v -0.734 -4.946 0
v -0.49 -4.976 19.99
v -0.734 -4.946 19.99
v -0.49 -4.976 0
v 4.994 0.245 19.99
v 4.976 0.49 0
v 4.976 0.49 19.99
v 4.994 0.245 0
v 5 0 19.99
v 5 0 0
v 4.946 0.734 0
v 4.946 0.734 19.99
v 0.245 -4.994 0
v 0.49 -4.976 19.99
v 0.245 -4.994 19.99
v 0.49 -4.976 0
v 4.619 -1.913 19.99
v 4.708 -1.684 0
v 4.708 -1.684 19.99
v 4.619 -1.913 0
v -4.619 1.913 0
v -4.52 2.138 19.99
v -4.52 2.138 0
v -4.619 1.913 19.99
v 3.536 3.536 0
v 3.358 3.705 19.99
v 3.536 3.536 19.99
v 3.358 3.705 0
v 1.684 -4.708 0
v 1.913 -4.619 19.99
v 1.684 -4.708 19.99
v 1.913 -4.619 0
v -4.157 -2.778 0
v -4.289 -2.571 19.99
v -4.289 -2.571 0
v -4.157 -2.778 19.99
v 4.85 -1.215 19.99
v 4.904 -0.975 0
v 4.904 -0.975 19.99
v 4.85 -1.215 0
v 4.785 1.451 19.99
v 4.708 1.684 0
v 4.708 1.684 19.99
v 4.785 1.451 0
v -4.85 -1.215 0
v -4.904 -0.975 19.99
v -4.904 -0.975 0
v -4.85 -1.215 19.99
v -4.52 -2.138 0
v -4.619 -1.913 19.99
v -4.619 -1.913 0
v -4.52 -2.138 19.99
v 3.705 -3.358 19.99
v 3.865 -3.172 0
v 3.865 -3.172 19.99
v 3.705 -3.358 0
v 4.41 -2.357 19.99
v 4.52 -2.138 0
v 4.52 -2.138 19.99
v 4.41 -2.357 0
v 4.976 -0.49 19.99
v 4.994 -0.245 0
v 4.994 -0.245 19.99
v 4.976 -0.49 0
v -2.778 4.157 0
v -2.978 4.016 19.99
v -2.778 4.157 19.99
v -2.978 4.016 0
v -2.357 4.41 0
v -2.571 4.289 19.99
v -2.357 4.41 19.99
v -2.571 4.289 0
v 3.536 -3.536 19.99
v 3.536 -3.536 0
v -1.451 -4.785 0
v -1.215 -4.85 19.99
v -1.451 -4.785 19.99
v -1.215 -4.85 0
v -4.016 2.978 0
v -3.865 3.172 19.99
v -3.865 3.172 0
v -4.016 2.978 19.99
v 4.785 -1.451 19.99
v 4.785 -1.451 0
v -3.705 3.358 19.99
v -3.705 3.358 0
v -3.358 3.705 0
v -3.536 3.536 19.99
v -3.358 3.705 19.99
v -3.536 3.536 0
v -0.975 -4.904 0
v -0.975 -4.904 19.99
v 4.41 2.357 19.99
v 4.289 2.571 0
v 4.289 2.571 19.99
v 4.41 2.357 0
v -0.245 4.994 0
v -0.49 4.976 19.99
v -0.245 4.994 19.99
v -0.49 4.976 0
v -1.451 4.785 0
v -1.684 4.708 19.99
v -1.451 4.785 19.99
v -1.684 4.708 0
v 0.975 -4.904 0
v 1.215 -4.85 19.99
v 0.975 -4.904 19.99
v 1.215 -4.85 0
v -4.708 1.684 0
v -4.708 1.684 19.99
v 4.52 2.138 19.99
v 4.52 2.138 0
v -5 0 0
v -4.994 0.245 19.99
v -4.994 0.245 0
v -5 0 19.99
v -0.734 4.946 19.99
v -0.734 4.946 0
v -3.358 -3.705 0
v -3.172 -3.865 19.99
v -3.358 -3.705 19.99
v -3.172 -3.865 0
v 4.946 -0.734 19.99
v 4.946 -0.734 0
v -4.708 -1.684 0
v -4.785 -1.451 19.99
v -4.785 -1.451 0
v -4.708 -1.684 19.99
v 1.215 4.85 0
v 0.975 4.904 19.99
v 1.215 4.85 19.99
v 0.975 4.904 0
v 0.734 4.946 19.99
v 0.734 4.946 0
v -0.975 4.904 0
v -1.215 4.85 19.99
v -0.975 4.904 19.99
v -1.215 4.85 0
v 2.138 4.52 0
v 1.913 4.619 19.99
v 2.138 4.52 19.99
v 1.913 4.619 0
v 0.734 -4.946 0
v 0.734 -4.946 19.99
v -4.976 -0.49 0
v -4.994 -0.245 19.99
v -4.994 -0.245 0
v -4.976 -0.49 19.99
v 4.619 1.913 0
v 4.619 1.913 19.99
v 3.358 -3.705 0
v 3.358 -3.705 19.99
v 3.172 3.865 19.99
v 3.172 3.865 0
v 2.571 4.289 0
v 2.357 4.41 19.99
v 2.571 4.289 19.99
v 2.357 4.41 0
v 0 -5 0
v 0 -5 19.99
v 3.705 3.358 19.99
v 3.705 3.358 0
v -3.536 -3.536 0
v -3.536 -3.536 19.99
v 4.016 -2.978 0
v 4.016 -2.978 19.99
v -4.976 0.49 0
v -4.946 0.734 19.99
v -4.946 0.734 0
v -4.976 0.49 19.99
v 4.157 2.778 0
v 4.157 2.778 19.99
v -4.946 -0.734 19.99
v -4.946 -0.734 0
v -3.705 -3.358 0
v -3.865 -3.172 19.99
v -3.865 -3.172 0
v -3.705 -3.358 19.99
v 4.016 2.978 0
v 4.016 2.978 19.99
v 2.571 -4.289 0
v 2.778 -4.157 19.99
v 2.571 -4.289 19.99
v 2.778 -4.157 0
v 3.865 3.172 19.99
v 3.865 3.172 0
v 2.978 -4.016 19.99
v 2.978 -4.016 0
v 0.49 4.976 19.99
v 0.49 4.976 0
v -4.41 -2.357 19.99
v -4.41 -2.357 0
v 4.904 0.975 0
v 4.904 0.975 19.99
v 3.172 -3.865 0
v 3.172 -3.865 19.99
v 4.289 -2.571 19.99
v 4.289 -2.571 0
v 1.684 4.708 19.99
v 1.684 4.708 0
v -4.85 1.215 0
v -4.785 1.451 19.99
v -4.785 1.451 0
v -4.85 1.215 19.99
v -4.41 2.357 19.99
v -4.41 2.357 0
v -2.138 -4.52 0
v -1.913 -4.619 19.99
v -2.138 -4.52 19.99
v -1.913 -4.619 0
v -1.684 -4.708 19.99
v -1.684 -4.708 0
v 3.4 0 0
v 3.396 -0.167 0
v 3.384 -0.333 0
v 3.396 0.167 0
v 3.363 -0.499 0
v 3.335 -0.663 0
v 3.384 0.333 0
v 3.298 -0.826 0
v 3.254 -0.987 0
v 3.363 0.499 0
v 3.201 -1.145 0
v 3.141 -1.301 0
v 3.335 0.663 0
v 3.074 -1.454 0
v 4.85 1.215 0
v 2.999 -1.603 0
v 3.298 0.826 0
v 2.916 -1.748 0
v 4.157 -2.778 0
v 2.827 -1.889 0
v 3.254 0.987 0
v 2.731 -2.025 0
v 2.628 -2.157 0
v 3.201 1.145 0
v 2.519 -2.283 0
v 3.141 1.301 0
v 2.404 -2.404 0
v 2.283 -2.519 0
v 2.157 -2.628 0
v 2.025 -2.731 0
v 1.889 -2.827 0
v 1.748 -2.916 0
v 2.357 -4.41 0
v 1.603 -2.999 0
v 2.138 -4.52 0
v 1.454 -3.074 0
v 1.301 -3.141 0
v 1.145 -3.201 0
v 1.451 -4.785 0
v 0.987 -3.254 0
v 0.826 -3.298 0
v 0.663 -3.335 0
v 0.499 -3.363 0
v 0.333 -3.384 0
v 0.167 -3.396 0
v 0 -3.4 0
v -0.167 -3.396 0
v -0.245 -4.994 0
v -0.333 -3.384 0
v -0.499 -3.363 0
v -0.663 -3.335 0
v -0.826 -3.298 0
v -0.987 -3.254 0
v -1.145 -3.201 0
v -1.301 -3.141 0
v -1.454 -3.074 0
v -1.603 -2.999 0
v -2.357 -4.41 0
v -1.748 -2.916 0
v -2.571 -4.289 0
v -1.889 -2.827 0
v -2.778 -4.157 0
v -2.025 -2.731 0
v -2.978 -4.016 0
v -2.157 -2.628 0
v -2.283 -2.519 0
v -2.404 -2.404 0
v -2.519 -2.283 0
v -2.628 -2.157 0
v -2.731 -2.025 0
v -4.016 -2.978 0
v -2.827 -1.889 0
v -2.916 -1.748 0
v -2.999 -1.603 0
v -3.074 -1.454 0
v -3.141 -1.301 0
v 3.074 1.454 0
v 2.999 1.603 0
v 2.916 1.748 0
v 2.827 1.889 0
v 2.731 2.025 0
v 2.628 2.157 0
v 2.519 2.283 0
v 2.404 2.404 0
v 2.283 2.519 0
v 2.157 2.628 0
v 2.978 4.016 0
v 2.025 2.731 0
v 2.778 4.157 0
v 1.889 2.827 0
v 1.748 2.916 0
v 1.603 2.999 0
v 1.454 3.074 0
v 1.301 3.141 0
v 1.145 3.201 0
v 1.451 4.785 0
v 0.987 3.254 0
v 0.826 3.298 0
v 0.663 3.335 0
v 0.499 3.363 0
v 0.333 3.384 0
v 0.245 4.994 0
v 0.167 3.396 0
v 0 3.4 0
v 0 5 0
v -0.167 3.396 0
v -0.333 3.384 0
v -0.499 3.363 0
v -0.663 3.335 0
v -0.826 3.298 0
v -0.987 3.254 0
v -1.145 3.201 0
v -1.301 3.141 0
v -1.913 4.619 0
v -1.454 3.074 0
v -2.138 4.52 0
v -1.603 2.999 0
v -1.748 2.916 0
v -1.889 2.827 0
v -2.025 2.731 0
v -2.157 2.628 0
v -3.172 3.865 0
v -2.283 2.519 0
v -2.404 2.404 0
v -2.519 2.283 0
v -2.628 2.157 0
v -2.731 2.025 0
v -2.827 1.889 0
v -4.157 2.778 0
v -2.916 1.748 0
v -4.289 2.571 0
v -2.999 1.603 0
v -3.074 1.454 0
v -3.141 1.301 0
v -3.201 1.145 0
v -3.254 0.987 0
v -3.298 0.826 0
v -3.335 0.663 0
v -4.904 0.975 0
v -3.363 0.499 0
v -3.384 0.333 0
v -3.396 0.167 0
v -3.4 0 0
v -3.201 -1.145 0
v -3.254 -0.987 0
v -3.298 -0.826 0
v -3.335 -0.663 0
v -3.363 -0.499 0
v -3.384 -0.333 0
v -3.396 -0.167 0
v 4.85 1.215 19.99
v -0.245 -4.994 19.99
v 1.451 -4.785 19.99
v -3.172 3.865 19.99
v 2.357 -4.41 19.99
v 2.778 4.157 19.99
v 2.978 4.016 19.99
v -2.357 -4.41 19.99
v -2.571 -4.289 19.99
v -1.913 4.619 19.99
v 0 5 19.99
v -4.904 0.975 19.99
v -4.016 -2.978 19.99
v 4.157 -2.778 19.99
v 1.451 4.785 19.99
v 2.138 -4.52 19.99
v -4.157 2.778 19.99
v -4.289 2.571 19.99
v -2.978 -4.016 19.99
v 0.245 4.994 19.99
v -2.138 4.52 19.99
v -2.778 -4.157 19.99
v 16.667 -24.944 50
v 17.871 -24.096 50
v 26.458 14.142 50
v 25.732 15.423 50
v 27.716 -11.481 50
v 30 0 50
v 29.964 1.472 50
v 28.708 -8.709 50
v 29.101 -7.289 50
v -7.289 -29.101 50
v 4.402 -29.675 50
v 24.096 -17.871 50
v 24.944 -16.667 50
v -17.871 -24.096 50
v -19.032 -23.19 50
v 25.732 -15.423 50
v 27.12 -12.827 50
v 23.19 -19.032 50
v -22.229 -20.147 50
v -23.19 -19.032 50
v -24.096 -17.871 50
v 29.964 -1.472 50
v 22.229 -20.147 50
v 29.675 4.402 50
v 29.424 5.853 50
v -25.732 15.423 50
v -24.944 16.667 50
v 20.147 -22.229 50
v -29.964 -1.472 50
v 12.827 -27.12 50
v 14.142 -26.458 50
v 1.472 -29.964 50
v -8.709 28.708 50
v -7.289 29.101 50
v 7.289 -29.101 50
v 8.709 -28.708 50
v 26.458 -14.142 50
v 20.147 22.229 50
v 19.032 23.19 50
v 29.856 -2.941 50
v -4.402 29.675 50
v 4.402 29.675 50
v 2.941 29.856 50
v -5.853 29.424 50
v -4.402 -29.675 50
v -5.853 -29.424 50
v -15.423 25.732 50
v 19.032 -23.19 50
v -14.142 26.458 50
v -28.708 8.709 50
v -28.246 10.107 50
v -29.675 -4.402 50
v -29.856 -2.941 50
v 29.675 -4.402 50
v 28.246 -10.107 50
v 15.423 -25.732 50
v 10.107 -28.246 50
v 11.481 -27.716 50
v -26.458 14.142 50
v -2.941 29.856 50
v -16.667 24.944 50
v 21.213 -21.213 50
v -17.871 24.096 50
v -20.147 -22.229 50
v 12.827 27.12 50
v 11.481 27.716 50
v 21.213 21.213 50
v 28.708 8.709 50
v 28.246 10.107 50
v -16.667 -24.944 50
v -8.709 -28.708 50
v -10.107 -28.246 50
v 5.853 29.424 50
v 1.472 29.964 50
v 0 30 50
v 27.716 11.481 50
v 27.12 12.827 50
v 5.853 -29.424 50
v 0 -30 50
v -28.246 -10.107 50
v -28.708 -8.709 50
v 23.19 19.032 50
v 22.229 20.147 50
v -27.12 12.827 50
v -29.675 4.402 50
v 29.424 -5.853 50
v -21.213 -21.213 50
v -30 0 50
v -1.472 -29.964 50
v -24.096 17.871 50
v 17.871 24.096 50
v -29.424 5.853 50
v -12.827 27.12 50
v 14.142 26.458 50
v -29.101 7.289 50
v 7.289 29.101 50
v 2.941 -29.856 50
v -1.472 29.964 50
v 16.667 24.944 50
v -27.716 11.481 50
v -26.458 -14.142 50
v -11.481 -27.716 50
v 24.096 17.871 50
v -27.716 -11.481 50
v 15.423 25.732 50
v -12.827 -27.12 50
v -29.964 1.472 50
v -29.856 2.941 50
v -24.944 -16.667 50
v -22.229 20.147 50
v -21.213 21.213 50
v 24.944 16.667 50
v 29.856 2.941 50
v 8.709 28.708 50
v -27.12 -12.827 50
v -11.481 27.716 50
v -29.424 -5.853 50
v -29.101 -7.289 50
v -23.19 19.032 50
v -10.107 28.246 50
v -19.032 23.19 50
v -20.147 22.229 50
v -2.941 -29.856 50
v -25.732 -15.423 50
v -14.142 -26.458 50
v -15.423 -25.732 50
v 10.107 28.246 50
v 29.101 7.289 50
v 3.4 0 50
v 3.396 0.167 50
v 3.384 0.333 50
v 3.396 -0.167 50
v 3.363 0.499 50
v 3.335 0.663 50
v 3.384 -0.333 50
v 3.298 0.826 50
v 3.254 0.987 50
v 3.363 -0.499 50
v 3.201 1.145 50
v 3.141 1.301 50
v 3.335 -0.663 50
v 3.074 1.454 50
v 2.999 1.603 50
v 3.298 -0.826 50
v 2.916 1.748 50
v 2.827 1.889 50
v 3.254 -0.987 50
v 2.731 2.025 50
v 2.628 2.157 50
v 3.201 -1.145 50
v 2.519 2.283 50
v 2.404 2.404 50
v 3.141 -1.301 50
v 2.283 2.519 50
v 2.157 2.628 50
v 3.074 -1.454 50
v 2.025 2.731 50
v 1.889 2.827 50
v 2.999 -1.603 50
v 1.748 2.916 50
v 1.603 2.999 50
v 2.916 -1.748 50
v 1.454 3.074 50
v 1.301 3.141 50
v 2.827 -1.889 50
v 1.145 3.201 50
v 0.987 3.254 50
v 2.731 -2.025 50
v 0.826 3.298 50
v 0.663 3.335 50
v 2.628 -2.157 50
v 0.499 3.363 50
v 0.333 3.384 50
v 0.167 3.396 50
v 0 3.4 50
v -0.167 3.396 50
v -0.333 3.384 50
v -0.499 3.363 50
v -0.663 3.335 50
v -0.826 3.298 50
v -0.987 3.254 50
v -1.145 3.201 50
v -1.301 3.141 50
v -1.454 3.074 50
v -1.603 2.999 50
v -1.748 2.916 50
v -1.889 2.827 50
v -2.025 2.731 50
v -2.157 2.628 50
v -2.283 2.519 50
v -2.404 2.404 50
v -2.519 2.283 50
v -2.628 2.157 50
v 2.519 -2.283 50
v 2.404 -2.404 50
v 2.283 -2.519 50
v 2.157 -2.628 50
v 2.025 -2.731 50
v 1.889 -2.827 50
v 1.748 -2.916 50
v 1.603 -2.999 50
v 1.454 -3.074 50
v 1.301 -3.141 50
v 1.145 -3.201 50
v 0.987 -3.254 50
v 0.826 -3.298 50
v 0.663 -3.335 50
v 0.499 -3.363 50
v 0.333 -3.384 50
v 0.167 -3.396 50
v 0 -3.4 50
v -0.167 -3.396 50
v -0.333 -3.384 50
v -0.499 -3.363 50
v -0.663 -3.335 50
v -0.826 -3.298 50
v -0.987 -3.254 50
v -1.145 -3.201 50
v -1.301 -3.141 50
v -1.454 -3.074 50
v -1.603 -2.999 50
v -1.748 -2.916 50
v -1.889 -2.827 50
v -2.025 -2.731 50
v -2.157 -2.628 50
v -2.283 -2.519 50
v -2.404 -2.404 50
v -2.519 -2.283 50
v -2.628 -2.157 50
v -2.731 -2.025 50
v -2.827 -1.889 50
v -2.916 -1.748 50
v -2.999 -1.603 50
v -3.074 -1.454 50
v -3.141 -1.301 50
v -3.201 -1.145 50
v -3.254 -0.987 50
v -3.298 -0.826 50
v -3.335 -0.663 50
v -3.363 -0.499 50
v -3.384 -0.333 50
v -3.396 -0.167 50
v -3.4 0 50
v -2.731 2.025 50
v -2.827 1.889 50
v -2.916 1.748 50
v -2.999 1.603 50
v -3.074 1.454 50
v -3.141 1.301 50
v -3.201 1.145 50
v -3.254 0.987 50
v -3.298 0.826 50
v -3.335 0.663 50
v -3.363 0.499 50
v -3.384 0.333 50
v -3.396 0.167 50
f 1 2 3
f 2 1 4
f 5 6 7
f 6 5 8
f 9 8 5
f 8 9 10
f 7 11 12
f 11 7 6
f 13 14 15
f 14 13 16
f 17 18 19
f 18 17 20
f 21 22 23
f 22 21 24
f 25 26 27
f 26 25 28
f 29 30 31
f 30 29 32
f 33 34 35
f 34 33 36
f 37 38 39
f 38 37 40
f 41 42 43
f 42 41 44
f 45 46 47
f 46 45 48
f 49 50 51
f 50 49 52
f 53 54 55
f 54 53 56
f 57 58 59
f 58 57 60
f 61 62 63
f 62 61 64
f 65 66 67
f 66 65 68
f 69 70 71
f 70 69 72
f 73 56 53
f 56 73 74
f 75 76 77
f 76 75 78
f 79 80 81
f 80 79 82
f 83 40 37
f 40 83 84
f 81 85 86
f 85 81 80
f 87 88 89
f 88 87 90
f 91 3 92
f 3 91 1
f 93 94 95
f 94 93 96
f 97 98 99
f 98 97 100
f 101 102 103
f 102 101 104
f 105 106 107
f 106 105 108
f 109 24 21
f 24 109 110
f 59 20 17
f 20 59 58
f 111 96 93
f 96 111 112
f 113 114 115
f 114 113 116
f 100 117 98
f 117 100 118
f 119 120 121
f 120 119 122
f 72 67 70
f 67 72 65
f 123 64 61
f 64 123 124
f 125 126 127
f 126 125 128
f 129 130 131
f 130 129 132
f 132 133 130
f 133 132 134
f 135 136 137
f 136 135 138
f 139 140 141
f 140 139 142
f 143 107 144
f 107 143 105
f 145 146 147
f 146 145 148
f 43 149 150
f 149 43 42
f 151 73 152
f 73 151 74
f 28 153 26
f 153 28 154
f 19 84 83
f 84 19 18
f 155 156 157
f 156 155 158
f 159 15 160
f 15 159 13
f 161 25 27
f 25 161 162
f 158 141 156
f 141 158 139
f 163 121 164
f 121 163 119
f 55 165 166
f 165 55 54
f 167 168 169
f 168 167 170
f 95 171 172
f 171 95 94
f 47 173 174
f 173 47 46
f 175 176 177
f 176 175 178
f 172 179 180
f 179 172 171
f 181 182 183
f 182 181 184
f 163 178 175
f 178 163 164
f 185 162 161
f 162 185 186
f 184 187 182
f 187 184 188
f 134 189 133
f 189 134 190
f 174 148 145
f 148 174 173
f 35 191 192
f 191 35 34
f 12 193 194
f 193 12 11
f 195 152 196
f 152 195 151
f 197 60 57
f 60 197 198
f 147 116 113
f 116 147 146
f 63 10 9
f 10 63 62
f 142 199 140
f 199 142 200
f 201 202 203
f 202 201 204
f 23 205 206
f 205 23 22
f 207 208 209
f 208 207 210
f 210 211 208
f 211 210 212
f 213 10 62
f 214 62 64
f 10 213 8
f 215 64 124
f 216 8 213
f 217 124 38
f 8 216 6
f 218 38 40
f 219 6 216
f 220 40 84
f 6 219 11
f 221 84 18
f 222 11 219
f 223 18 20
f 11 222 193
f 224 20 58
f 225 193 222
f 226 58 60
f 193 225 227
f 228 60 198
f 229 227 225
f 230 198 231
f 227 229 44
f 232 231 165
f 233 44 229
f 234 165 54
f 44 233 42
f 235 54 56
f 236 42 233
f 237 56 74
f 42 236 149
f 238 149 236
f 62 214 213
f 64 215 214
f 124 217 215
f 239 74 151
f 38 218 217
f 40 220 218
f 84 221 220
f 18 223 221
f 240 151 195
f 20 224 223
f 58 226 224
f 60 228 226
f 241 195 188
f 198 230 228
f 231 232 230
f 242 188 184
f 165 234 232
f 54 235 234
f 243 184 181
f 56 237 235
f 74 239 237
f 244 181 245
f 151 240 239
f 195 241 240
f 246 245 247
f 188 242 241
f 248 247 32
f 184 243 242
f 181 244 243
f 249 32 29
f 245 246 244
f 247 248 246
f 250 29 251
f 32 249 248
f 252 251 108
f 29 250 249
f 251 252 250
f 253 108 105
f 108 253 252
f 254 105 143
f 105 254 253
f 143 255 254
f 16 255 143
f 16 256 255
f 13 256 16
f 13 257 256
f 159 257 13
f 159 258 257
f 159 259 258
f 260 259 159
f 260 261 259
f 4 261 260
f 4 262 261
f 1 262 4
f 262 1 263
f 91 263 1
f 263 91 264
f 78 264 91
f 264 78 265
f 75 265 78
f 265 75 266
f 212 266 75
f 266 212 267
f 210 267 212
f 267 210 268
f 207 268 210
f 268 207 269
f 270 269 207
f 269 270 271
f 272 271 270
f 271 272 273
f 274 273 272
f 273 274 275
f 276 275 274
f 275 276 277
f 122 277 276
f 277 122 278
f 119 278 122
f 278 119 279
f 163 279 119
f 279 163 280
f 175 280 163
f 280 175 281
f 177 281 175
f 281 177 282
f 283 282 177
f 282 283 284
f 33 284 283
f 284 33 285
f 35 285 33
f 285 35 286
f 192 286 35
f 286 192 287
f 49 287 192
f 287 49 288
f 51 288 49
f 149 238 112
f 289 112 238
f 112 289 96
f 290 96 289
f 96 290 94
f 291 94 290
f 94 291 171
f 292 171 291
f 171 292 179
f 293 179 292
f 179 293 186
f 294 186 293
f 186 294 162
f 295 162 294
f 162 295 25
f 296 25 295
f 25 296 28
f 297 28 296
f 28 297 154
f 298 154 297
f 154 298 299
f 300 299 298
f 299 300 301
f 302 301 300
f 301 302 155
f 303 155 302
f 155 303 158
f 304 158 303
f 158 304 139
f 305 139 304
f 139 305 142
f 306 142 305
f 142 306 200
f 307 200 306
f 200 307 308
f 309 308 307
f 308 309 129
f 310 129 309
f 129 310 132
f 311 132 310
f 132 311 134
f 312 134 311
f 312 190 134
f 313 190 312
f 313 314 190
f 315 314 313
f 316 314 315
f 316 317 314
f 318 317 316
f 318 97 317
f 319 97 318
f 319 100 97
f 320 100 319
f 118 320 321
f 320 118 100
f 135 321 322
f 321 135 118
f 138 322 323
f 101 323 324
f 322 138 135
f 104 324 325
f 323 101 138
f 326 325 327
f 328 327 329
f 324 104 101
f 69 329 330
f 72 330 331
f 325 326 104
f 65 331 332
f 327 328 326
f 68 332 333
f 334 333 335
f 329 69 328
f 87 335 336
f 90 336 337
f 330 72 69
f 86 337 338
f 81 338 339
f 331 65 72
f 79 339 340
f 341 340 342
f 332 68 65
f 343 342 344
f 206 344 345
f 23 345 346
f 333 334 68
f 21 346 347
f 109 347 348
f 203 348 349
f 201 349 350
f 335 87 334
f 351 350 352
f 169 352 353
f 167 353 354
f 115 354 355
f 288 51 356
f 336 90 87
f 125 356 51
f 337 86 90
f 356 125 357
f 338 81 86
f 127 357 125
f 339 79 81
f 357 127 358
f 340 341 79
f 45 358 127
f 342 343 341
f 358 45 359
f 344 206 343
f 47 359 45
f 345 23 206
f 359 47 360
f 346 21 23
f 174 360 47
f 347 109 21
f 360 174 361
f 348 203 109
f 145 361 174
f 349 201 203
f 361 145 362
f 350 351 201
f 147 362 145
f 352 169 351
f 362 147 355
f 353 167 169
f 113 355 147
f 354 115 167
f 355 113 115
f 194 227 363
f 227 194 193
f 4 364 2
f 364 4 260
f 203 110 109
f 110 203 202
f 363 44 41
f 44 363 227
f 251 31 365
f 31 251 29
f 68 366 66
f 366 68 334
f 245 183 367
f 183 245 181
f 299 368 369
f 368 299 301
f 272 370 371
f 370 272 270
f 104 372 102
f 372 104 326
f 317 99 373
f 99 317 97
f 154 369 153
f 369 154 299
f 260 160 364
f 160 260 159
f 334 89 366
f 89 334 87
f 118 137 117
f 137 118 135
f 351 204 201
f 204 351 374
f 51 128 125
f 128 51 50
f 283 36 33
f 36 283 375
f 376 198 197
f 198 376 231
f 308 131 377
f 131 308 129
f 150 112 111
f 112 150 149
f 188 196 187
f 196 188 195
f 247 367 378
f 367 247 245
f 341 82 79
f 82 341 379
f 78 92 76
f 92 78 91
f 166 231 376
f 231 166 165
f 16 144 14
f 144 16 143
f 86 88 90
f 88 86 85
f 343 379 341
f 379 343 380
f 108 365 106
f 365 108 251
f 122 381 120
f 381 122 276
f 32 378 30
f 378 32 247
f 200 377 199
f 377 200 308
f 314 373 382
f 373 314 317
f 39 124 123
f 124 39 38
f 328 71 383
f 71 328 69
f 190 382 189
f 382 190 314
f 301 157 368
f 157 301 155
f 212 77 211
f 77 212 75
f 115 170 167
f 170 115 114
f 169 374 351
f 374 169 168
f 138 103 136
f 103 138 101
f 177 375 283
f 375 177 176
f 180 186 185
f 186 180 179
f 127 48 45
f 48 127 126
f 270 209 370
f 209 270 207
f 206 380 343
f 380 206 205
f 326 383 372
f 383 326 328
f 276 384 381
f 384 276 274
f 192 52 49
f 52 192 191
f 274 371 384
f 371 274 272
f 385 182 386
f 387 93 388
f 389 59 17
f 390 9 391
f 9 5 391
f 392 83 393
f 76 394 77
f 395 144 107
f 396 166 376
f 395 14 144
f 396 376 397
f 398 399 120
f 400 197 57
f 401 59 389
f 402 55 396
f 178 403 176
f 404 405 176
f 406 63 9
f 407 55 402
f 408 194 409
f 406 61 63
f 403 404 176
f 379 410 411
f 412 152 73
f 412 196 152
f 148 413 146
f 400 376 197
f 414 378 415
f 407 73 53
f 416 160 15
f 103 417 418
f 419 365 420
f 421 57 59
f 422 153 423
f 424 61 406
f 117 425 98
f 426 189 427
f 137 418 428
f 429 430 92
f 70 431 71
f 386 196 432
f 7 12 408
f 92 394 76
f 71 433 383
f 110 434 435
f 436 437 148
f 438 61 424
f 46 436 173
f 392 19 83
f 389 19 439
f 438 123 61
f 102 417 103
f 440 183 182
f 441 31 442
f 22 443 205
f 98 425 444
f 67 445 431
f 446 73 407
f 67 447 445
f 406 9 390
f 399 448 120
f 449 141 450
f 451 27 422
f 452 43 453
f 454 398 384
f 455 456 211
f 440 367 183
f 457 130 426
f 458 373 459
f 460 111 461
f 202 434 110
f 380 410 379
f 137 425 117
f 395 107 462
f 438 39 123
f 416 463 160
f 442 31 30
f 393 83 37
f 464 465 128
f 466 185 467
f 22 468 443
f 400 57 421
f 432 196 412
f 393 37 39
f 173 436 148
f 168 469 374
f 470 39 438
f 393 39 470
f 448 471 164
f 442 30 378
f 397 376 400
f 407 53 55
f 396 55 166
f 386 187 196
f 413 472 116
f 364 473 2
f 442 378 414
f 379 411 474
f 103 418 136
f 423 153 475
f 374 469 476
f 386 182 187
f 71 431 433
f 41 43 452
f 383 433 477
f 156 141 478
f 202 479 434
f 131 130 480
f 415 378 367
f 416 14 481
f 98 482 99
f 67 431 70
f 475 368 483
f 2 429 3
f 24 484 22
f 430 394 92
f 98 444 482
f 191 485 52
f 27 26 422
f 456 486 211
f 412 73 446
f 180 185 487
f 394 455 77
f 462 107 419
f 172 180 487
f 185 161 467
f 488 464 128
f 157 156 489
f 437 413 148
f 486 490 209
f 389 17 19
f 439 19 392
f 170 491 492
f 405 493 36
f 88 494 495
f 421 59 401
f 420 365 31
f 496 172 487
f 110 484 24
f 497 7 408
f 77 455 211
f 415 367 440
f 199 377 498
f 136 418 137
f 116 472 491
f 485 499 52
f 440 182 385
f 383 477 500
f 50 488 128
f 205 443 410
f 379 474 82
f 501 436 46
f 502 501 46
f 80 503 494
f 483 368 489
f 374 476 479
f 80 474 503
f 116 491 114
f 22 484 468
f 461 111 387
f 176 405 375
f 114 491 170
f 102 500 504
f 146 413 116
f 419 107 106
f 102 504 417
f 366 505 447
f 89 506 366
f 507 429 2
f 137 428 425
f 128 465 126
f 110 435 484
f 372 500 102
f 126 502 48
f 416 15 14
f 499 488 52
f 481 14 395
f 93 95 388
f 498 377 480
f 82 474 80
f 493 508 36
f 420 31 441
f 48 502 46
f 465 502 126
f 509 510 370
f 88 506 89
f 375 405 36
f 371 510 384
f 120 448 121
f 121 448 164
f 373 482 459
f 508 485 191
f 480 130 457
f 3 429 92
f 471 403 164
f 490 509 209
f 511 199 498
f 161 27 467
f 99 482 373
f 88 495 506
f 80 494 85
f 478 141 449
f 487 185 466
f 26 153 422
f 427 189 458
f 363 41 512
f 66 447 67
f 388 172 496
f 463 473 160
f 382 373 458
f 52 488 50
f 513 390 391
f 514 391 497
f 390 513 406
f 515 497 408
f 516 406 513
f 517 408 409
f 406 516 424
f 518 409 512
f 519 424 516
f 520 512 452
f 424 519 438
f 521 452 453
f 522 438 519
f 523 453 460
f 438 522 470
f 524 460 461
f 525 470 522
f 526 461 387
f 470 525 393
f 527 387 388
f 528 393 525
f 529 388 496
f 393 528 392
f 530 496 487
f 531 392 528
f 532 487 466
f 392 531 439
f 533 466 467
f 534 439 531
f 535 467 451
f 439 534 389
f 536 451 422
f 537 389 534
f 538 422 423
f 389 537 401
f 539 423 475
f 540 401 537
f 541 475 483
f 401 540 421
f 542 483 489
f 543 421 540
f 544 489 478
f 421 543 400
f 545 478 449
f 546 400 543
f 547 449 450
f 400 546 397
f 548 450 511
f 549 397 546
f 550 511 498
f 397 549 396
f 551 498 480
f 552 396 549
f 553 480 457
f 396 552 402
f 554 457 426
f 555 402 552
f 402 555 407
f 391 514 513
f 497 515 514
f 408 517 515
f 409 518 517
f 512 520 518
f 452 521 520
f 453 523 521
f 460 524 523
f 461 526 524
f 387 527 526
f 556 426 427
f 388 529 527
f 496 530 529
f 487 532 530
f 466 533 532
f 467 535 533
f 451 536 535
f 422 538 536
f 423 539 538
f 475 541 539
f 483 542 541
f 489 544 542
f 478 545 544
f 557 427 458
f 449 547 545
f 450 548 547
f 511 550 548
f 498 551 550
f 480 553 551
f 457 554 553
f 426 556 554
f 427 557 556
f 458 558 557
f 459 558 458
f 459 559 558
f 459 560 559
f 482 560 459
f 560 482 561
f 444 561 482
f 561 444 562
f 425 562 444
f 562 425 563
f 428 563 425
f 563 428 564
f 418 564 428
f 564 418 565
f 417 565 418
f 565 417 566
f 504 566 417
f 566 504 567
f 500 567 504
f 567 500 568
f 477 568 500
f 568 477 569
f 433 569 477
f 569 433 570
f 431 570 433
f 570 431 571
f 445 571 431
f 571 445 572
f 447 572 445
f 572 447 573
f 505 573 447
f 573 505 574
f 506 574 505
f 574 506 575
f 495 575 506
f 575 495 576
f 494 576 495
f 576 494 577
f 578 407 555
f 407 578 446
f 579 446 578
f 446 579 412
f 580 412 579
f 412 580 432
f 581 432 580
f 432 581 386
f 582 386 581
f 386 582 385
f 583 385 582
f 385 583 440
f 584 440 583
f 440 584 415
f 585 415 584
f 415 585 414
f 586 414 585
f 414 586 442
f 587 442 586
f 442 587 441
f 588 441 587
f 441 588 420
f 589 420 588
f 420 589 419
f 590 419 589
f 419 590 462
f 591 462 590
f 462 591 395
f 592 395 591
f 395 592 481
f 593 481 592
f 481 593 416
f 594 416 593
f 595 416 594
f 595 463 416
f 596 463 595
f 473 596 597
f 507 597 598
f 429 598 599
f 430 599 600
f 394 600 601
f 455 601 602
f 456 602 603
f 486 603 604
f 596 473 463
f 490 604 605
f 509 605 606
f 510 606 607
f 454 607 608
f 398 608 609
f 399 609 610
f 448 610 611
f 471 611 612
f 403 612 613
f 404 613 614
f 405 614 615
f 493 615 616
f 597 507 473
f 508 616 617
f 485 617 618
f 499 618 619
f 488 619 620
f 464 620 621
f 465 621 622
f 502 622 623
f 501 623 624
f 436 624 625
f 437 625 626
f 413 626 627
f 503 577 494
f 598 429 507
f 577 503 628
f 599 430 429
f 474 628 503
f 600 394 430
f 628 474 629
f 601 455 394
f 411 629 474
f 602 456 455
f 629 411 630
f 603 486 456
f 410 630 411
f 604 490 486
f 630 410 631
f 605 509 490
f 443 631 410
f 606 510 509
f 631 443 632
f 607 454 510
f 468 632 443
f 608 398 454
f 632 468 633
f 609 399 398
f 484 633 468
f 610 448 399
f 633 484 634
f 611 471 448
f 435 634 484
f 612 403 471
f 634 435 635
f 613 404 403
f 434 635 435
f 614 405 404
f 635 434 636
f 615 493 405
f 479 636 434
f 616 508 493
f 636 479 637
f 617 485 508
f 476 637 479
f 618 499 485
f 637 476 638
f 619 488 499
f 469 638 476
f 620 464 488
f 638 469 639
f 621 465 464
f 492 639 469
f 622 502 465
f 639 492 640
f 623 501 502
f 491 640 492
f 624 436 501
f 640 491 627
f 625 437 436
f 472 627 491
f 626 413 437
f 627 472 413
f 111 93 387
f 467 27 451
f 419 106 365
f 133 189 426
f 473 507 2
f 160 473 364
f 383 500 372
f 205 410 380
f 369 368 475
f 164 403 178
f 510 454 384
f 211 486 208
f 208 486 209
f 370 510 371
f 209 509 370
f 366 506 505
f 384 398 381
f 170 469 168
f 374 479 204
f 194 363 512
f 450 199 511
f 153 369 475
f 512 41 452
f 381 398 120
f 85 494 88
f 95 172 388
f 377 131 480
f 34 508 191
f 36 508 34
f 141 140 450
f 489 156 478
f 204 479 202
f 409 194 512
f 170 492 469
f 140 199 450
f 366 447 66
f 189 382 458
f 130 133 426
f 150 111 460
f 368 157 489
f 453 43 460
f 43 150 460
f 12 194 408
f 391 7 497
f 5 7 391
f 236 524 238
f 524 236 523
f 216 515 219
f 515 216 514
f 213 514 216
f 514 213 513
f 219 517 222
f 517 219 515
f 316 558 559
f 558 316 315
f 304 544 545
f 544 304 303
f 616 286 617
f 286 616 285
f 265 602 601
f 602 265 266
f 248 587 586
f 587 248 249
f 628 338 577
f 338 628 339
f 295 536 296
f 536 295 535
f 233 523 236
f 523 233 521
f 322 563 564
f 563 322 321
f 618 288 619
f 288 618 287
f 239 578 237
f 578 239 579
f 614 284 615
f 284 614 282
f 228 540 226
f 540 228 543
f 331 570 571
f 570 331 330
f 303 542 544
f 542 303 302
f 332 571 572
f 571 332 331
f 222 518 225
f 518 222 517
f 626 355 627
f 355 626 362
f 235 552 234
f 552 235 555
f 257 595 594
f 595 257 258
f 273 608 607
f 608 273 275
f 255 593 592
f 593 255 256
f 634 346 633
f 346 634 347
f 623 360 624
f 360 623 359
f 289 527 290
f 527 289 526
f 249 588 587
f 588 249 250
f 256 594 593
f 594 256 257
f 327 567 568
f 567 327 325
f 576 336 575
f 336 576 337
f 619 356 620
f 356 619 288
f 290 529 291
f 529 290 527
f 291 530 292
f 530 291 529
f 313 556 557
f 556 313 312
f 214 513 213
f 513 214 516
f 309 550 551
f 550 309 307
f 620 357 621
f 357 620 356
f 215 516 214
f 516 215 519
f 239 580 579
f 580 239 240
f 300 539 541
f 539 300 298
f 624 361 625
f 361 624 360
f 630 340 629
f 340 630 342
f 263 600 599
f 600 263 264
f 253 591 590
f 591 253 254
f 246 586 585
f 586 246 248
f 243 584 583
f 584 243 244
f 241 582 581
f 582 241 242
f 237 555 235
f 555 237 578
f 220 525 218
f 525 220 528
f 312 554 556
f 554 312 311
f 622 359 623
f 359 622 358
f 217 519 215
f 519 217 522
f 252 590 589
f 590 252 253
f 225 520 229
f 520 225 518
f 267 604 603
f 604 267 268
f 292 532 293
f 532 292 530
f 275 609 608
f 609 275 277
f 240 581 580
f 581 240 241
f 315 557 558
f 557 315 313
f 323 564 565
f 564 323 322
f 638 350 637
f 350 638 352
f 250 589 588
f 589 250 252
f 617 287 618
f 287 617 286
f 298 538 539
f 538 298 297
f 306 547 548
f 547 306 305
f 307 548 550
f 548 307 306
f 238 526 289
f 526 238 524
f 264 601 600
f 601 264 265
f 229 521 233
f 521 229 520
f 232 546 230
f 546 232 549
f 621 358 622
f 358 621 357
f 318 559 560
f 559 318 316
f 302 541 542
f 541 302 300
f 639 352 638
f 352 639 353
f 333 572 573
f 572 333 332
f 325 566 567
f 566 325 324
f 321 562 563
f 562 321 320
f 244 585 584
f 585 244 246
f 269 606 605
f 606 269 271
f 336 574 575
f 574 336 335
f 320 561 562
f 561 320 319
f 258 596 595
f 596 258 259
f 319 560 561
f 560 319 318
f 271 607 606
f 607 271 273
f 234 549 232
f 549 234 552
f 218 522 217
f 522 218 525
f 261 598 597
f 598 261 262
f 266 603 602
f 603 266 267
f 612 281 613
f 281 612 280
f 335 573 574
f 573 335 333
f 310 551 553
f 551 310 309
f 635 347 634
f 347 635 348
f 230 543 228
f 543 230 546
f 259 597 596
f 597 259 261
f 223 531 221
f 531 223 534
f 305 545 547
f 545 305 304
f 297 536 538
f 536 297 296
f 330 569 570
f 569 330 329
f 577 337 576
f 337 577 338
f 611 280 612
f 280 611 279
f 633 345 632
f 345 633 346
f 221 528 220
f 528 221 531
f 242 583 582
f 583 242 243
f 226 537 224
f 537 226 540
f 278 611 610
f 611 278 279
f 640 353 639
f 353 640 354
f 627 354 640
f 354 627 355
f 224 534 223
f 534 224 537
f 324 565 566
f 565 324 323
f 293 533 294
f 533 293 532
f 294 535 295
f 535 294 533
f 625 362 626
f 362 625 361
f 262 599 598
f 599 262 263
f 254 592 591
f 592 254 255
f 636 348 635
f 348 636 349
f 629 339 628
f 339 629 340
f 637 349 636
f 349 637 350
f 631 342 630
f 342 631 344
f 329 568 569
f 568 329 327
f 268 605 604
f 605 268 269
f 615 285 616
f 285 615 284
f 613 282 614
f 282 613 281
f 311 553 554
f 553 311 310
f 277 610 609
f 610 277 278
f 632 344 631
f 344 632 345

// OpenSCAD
// Small lab funnel, printed upright: spout at the bottom (z = 0), wide opening at the top.
// All dimensions in millimetres.

$fn = 128;

// ---- Spout ----
spout_od      = 10;    // spout outer diameter
spout_id      = spout_od - 2 * 1.6;  // spout bore diameter (6.8 mm)
spout_length  = 20;    // spout runs from z = 0 to z = 20

// ---- Cone ----
cone_bottom_d = spout_od;         // cone outer diameter at z = 20 (10 mm)
cone_top_d    = 60;               // cone outer diameter at the rim (60 mm)
cone_top_z    = 50;               // rim height (z = 50)
cone_wall     = 1.6;              // cone wall thickness everywhere

// ---- Cutting overlap ----
eps           = 0.5;            // extension of cutters past faces

difference() {
    union() {
        // Spout: solid tube from z = 0 to z = 20
        cylinder(d = spout_od, h = spout_length);

        // Cone: outer shell from z = 20 to z = 50 (slight overlap into spout for a clean union)
        translate([0, 0, spout_length - 0.01])
            cylinder(h = cone_top_z - spout_length + 0.01,
                     d1 = cone_bottom_d,
                     d2 = cone_top_d);
    }

    // Bore: straight channel through the spout and cone (6.8 mm throughout)
    translate([0, 0, -eps])
        cylinder(h = cone_top_z + 2 * eps, d = spout_id);
}
